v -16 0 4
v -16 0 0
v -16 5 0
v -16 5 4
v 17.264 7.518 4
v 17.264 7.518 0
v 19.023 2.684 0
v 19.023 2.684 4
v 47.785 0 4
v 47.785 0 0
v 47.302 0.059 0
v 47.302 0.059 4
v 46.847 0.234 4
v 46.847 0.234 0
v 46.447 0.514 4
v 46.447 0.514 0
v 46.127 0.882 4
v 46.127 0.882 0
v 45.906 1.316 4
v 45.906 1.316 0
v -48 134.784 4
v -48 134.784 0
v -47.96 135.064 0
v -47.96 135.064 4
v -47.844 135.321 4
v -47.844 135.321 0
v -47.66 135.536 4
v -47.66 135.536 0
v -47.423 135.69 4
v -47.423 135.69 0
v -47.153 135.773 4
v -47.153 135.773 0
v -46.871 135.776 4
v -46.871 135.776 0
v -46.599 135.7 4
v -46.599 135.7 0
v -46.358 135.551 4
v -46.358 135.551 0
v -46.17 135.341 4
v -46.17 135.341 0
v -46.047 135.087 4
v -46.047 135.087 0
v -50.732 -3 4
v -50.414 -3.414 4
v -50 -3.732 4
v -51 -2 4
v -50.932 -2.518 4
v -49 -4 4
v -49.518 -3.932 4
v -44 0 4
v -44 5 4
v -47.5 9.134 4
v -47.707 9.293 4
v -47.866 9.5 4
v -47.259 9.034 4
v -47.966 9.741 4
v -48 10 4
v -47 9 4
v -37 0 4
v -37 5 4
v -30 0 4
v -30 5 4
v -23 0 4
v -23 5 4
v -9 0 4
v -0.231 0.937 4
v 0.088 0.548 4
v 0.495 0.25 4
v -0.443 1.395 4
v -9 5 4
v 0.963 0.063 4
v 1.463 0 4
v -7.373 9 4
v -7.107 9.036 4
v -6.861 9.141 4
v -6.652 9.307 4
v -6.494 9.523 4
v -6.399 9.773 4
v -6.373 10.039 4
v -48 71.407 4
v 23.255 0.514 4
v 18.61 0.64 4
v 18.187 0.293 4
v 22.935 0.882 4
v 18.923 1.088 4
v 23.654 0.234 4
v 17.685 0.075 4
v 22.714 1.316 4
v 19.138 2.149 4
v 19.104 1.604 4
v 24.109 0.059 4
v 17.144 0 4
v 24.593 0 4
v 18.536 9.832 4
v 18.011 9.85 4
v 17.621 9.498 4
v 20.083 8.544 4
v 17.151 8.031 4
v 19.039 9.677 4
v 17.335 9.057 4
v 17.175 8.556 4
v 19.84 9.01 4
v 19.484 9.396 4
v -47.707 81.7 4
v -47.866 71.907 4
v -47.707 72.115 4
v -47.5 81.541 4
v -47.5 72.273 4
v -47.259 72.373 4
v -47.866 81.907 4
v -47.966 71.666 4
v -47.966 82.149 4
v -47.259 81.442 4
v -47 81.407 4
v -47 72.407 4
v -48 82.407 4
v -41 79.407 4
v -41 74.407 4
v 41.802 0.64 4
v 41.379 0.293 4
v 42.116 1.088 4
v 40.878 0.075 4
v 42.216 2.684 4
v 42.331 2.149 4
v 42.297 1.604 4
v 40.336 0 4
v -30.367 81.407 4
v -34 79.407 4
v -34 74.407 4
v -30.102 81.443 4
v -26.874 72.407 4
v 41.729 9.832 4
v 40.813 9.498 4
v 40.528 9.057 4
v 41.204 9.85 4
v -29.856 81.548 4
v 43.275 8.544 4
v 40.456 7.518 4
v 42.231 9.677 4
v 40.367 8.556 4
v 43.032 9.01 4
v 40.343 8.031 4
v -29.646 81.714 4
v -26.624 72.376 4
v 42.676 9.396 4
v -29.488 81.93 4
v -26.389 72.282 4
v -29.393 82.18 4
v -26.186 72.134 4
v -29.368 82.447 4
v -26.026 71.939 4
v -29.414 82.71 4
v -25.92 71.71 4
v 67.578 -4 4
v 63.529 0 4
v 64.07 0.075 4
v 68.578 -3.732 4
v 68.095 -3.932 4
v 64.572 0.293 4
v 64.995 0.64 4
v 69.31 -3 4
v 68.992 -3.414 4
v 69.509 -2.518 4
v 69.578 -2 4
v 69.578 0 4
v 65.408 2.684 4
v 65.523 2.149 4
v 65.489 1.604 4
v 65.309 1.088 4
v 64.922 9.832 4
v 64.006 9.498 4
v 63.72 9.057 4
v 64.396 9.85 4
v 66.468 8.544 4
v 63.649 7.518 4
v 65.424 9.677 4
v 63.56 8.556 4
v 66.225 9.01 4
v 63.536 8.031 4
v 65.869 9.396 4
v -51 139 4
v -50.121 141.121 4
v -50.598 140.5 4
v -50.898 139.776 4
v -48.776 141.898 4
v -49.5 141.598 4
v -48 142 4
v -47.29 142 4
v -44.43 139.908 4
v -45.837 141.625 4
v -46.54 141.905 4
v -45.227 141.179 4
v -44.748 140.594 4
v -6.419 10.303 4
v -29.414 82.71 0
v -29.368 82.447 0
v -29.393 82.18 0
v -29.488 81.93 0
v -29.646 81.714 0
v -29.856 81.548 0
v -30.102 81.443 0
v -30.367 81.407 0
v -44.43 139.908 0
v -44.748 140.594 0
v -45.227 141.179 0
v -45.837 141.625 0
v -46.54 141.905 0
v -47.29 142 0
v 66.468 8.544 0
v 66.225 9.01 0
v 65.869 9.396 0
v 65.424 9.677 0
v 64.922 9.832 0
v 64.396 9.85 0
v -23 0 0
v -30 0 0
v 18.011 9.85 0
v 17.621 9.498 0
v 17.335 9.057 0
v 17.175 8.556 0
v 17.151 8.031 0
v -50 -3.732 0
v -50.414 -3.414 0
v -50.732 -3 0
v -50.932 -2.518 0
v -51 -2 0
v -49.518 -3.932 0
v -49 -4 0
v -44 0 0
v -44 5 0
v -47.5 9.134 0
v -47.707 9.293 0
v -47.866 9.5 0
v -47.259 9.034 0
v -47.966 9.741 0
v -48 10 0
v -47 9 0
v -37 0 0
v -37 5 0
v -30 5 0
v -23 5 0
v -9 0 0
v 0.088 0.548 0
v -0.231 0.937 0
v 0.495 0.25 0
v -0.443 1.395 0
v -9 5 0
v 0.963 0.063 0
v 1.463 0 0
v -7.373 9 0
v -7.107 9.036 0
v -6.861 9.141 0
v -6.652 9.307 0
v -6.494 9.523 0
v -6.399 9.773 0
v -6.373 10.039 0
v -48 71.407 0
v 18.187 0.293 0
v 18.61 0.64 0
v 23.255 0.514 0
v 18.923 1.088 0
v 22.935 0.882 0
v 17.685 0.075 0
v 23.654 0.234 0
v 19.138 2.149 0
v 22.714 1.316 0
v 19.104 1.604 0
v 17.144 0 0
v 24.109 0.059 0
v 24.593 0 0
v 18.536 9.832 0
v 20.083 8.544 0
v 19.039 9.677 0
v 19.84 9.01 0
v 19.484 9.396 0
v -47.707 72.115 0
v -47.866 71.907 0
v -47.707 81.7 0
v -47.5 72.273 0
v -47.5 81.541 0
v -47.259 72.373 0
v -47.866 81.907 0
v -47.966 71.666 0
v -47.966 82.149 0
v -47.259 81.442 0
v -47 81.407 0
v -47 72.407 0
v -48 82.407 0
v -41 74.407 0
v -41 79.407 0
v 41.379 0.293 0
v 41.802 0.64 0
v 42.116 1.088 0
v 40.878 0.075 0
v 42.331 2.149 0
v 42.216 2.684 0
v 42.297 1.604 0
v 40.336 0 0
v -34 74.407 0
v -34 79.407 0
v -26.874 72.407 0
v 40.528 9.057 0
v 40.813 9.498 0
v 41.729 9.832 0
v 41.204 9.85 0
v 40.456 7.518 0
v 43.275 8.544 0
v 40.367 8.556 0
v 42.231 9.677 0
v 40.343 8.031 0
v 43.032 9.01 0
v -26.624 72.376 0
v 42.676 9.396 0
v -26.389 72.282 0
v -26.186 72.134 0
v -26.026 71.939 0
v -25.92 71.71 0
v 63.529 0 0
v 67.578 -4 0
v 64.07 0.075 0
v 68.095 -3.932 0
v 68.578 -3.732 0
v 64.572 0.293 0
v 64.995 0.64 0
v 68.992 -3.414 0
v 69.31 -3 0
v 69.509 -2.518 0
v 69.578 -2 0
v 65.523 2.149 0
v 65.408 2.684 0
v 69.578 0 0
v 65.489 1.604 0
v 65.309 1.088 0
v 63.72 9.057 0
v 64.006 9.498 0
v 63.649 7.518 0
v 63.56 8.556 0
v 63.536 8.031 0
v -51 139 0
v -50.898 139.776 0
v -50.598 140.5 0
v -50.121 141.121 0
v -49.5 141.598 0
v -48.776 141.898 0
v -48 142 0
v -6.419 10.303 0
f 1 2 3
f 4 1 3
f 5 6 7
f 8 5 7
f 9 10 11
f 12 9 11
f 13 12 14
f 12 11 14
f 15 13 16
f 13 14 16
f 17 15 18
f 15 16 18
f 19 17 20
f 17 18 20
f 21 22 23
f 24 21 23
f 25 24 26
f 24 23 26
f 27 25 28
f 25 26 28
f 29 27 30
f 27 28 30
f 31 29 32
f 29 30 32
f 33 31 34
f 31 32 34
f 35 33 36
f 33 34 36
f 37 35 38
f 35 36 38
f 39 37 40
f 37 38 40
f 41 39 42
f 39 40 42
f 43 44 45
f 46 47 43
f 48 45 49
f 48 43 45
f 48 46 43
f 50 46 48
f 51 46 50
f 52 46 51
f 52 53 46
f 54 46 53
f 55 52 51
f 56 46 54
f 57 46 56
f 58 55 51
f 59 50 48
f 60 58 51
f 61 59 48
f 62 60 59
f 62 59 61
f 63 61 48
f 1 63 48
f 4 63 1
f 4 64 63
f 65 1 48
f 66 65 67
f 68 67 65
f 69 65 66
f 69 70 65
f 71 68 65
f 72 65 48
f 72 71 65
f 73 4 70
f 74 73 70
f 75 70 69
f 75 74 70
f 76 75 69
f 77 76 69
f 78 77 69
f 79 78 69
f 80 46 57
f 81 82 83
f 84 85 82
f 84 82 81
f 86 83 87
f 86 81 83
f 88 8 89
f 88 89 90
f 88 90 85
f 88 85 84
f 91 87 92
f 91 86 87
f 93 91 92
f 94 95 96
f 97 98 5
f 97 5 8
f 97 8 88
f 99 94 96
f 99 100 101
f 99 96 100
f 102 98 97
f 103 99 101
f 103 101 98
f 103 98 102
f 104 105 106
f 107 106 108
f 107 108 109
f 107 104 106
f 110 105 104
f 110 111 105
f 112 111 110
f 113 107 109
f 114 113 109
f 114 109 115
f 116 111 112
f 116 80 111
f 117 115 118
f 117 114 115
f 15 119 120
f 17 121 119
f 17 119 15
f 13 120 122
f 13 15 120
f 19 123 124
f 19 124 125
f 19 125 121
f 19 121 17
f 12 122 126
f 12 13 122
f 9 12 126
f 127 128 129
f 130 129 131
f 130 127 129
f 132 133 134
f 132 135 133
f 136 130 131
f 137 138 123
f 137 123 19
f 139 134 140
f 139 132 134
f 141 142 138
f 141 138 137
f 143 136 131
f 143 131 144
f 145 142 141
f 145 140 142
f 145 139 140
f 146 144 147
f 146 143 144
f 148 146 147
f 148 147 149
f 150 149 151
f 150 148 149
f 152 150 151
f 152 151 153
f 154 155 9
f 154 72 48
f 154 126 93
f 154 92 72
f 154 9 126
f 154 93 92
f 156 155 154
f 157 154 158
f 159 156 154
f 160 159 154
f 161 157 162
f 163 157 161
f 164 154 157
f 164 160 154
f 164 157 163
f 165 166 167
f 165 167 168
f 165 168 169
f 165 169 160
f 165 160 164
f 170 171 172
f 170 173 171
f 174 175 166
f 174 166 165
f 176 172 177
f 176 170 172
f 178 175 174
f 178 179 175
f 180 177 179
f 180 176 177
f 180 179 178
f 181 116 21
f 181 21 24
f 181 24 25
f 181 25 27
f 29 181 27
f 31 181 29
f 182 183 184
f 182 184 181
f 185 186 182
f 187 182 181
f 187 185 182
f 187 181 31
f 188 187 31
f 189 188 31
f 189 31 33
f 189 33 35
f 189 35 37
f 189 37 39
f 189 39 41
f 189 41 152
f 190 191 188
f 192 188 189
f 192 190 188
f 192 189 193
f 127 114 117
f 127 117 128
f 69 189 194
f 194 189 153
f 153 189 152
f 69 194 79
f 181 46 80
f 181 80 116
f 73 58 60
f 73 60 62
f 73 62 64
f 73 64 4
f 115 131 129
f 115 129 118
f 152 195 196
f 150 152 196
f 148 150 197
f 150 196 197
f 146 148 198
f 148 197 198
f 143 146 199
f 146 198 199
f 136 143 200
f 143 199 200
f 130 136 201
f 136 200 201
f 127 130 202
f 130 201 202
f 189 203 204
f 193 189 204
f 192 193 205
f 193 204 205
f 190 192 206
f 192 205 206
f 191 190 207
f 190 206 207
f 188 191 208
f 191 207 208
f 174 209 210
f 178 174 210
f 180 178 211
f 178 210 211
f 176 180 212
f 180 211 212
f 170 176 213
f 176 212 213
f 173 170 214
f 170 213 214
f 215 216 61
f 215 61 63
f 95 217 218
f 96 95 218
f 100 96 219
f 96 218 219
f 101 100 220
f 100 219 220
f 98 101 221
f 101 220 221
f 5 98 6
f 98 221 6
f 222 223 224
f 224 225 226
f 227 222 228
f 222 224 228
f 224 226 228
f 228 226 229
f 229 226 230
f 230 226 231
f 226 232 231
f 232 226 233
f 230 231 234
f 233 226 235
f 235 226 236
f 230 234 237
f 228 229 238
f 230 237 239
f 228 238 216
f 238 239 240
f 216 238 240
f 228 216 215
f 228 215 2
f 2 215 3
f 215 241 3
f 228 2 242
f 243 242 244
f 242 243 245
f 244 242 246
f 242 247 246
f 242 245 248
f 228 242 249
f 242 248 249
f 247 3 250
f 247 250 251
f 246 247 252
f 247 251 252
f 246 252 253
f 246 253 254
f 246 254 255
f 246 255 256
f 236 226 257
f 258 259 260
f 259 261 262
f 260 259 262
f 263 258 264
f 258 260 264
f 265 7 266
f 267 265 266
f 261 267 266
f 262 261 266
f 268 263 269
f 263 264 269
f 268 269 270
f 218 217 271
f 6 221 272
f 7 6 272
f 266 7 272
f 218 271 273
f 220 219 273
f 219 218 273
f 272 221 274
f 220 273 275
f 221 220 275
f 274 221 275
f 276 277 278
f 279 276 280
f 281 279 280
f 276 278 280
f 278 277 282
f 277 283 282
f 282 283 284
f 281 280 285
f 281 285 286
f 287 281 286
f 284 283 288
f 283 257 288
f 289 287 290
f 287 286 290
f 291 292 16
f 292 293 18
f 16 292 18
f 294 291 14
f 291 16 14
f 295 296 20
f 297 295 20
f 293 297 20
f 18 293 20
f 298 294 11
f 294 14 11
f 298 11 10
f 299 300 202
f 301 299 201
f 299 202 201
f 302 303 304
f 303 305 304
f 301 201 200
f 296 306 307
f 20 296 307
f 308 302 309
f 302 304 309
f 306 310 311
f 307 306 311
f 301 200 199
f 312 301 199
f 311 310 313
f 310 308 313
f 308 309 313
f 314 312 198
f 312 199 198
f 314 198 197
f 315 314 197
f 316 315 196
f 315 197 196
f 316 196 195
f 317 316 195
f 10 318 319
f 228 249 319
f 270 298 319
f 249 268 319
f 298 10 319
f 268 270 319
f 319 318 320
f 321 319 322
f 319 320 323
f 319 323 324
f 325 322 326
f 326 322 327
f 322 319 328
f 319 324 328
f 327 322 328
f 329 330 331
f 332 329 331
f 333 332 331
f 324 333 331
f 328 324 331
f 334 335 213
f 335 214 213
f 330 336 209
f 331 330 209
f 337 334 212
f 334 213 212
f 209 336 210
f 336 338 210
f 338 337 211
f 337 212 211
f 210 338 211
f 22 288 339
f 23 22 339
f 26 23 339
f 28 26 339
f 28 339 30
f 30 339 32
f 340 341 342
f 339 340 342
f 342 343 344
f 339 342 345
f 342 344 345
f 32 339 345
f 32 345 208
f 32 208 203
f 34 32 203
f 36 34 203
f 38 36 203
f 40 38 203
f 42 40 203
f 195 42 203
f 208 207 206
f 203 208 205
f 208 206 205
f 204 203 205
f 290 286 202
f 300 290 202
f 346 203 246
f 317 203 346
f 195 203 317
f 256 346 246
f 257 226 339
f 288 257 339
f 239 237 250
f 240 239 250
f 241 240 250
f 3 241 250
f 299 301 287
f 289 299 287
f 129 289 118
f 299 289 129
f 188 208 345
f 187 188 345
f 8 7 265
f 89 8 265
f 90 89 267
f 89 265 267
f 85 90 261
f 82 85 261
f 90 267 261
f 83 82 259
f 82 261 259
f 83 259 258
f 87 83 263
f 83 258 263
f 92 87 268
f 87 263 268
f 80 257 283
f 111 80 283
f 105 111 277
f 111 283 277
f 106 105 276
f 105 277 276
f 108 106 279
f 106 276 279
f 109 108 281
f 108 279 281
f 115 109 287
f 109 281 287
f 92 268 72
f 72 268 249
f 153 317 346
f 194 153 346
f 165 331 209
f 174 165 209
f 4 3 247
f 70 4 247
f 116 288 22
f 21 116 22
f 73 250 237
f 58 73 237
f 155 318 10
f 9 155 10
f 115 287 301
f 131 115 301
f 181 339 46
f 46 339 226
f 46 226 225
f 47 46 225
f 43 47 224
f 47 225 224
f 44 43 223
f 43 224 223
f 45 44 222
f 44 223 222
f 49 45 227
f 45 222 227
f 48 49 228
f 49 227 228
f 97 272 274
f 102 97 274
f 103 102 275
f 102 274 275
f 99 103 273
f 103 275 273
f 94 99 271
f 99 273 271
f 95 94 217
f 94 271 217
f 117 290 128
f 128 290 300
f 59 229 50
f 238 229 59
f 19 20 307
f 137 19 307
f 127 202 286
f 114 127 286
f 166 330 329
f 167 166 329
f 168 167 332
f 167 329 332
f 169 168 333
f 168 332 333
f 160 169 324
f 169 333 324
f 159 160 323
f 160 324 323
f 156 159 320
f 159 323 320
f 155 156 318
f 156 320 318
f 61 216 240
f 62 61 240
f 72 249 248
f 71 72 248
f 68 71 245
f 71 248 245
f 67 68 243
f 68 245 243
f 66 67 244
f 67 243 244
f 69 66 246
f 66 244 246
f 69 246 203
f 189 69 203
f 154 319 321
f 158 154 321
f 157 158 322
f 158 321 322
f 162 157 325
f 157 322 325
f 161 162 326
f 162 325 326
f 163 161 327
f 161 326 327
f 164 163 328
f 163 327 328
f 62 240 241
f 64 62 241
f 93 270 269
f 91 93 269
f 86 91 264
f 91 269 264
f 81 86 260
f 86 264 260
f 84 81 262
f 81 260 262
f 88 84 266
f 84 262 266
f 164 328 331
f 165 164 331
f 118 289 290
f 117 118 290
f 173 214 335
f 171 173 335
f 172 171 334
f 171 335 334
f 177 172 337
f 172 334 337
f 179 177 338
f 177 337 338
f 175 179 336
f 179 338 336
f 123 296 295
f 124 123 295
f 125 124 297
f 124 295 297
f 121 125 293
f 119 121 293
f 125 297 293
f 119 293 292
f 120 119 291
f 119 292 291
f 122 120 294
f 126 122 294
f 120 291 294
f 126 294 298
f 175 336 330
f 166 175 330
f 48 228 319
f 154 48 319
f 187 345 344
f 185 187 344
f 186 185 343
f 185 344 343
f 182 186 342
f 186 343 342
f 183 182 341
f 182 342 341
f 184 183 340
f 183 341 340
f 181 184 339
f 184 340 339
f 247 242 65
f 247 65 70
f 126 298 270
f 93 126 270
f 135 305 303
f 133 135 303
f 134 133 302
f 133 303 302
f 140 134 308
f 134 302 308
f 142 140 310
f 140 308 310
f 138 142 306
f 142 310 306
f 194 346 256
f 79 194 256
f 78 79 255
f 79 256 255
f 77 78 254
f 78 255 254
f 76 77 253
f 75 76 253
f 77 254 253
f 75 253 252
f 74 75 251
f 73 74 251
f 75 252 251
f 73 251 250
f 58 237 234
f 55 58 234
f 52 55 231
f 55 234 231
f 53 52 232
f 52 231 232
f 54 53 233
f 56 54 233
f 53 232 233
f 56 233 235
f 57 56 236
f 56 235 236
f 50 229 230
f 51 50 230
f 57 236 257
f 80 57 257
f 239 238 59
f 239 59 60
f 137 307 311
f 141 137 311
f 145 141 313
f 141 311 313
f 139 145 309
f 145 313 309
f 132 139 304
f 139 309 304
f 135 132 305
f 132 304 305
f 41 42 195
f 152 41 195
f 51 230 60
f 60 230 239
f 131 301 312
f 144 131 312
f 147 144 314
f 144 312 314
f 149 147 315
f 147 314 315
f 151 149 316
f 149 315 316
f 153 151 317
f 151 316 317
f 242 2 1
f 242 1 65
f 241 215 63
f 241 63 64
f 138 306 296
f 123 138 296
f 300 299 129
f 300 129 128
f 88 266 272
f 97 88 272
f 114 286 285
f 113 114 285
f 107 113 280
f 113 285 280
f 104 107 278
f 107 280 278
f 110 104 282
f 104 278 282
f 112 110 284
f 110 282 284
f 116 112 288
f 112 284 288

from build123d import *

# Parameters (mm, degrees)
F0_W        = 7
F0_H        = 5
F1_DEPTH    = 4
F2_T1_DEPTH = 4
F2_T3_DEPTH = 14


# Not quite as in the source:
# - a fillet or chamfer that OpenCascade refuses, or shapes differently, is made with other operations: its cross-section is extruded or revolved along the edge and cut away or added
# - a feature names something its author has since deleted; it is built from what else it names


with BuildPart() as f1:
    # F0 (on Top) → F1 (new body)
    with BuildSketch(Plane.XY):
        with BuildLine():
            Line((-51, 139), (-51, -4))
            Line((-51, -4), (69.5775999523, -4))
            Line((69.5775999523, -4), (69.5775999523, 0))
            Line((69.5775999523, 0), (66.3850666349, 0))
            Line((66.3850666349, 0), (46.3850666349, 0))
            Line((46.3850666349, 0), (43.1925333174, 0))
            Line((43.1925333174, 0), (23.1925333174, 0))
            Line((23.1925333174, 0), (20, 0))
            Line((20, 0), (0, 0))
            Line((0, 0), (-44.4302483166, 139.9080159757))
            ThreePointArc((-44.4302483166, 139.9080159757), (-45.5180993372, 141.4211616971), (-47.2895326655, 142))
            Line((-47.2895326655, 142), (-48, 142))
            ThreePointArc((-48, 142), (-50.1213203436, 141.1213203436), (-51, 139))
        make_face()
        with Locations((-40.5, 2.5)):
            Rectangle(F0_W, F0_H, mode=Mode.SUBTRACT)
        with Locations((-26.5, 2.5)):
            Rectangle(F0_W, F0_H, mode=Mode.SUBTRACT)
        with Locations((-12.5, 2.5)):
            Rectangle(F0_W, F0_H, mode=Mode.SUBTRACT)
        with BuildLine():
            Line((-7.3725300405, 9), (-47, 9))
            ThreePointArc((-47, 9), (-47.7071067812, 9.2928932188), (-48, 10))
            Line((-48, 10), (-48, 71.4074290533))
            ThreePointArc((-48, 71.4074290533), (-47.7071067812, 72.1145358345), (-47, 72.4074290533))
            Line((-47, 72.4074290533), (-26.8735379155, 72.4074290533))
            ThreePointArc((-26.8735379155, 72.4074290533), (-26.2830601394, 72.2144829523), (-25.9204431326, 71.7101010452))
            Line((-25.9204431326, 71.7101010452), (-6.4194352575, 10.3026719919))
            ThreePointArc((-6.4194352575, 10.3026719919), (-6.5654761415, 9.4095222239), (-7.3725300405, 9))
        make_face(mode=Mode.SUBTRACT)
        with Locations((-37.5, 76.9074290533)):
            Rectangle(F0_W, F0_H, mode=Mode.SUBTRACT)
        with BuildLine():
            ThreePointArc((-48, 134.7843734895), (-47.1531424452, 135.7725776139), (-46.046905217, 135.0870454814))
            Line((-46.046905217, 135.0870454814), (-29.4136863758, 82.7101010452))
            ThreePointArc((-29.4136863758, 82.7101010452), (-29.5597272597, 81.8169512772), (-30.3667811588, 81.4074290533))
            Line((-30.3667811588, 81.4074290533), (-47, 81.4074290533))
            ThreePointArc((-47, 81.4074290533), (-47.7071067812, 81.7003222721), (-48, 82.4074290533))
            Line((-48, 82.4074290533), (-48, 134.7843734895))
        make_face(mode=Mode.SUBTRACT)
        Polygon((66.3850666349, 0), (69.5775999523, 0), (65.783943064, 10.4229866378), (62.9648652016, 9.3969262079), align=None)
        Polygon((43.1925333174, 0), (46.3850666349, 0), (42.5914097465, 10.4229866378), (39.7723318842, 9.3969262079), align=None)
        Polygon((16.5797985667, 9.3969262079), (20, 0), (23.1925333174, 0), (19.3988764291, 10.4229866378), align=None)
    extrude(amount=F1_DEPTH)

    # F2: fillet of radius 2 on 14 edges, made by hand

    # F2_s2 → F2_t1 (join)
    with BuildSketch(Plane.XY):
        with BuildLine():
            ThreePointArc((42.2156225455, 2.6840402867), (41.9745413925, 0.8528471273), (40.3362373039, 0))
            Line((40.3362373039, 0), (43.1925333174, 0))
            Line((43.1925333174, 0), (42.2156225455, 2.6840402867))
        make_face()
        with BuildLine():
            ThreePointArc((47.7854817113, 0), (46.6383288386, 0.3616959114), (45.9060964697, 1.3159597133))
            Line((45.9060964697, 1.3159597133), (46.3850666349, 0))
            Line((46.3850666349, 0), (47.7854817113, 0))
        make_face()
        with BuildLine():
            ThreePointArc((65.4081558629, 2.6840402867), (65.1670747099, 0.8528471273), (63.5287706214, 0))
            Line((63.5287706214, 0), (66.3850666349, 0))
            Line((66.3850666349, 0), (65.4081558629, 2.6840402867))
        make_face()
        with BuildLine():
            ThreePointArc((24.5929483938, 0), (23.4457955211, 0.3616959114), (22.7135631523, 1.3159597133))
            Line((22.7135631523, 1.3159597133), (23.1925333174, 0))
            Line((23.1925333174, 0), (24.5929483938, 0))
        make_face()
        with BuildLine():
            ThreePointArc((19.0230892281, 2.6840402867), (18.7820080751, 0.8528471273), (17.1437039865, 0))
            Line((17.1437039865, 0), (20, 0))
            Line((20, 0), (19.0230892281, 2.6840402867))
        make_face()
        with BuildLine():
            ThreePointArc((1.4632920473, 0), (0.2823364951, 0.3858922019), (-0.4428975187, 1.3946560162))
            Line((-0.4428975187, 1.3946560162), (0, 0))
            Line((0, 0), (1.4632920473, 0))
        make_face()
    extrude(amount=F2_T1_DEPTH)

    # F2_s4 → F2_t3 (cut)
    with BuildSketch(Plane.XY.offset(-5)):
        with BuildLine():
            ThreePointArc((66.4679833506, 8.5436013963), (65.4338346325, 9.6721766837), (63.9045578224, 9.7389463512))
            Line((63.9045578224, 9.7389463512), (65.783943064, 10.4229866378))
            Line((65.783943064, 10.4229866378), (66.4679833506, 8.5436013963))
        make_face()
        with BuildLine():
            ThreePointArc((64.8442504432, 10.0809664945), (63.7156751557, 9.0468177764), (63.6489054883, 7.5175409663))
            Line((63.6489054883, 7.5175409663), (62.9648652016, 9.3969262079))
            Line((62.9648652016, 9.3969262079), (64.8442504432, 10.0809664945))
        make_face()
        with BuildLine():
            ThreePointArc((20.0829167158, 8.5436013963), (19.0487679977, 9.6721766837), (17.5194911875, 9.7389463512))
            Line((17.5194911875, 9.7389463512), (19.3988764291, 10.4229866378))
            Line((19.3988764291, 10.4229866378), (20.0829167158, 8.5436013963))
        make_face()
        with BuildLine():
            ThreePointArc((18.4591838083, 10.0809664945), (17.3306085209, 9.0468177764), (17.2638388534, 7.5175409663))
            Line((17.2638388534, 7.5175409663), (16.5797985667, 9.3969262079))
            Line((16.5797985667, 9.3969262079), (18.4591838083, 10.0809664945))
        make_face()
        with BuildLine():
            ThreePointArc((41.6517171257, 10.0809664945), (40.5231418383, 9.0468177764), (40.4563721708, 7.5175409663))
            Line((40.4563721708, 7.5175409663), (39.7723318842, 9.3969262079))
            Line((39.7723318842, 9.3969262079), (41.6517171257, 10.0809664945))
        make_face()
        with BuildLine():
            ThreePointArc((43.2754500332, 8.5436013963), (42.2413013151, 9.6721766837), (40.712024505, 9.7389463512))
            Line((40.712024505, 9.7389463512), (42.5914097465, 10.4229866378))
            Line((42.5914097465, 10.4229866378), (43.2754500332, 8.5436013963))
        make_face()
        with BuildLine():
            ThreePointArc((67.5775999523, -4), (68.9918135147, -3.4142135624), (69.5775999523, -2))
            Line((69.5775999523, -2), (69.5775999523, -4))
            Line((69.5775999523, -4), (67.5775999523, -4))
        make_face()
        with BuildLine():
            ThreePointArc((-51, -2), (-50.4142135624, -3.4142135624), (-49, -4))
            Line((-49, -4), (-51, -4))
            Line((-51, -4), (-51, -2))
        make_face()
    extrude(amount=F2_T3_DEPTH, mode=Mode.SUBTRACT)


solid = f1.part
